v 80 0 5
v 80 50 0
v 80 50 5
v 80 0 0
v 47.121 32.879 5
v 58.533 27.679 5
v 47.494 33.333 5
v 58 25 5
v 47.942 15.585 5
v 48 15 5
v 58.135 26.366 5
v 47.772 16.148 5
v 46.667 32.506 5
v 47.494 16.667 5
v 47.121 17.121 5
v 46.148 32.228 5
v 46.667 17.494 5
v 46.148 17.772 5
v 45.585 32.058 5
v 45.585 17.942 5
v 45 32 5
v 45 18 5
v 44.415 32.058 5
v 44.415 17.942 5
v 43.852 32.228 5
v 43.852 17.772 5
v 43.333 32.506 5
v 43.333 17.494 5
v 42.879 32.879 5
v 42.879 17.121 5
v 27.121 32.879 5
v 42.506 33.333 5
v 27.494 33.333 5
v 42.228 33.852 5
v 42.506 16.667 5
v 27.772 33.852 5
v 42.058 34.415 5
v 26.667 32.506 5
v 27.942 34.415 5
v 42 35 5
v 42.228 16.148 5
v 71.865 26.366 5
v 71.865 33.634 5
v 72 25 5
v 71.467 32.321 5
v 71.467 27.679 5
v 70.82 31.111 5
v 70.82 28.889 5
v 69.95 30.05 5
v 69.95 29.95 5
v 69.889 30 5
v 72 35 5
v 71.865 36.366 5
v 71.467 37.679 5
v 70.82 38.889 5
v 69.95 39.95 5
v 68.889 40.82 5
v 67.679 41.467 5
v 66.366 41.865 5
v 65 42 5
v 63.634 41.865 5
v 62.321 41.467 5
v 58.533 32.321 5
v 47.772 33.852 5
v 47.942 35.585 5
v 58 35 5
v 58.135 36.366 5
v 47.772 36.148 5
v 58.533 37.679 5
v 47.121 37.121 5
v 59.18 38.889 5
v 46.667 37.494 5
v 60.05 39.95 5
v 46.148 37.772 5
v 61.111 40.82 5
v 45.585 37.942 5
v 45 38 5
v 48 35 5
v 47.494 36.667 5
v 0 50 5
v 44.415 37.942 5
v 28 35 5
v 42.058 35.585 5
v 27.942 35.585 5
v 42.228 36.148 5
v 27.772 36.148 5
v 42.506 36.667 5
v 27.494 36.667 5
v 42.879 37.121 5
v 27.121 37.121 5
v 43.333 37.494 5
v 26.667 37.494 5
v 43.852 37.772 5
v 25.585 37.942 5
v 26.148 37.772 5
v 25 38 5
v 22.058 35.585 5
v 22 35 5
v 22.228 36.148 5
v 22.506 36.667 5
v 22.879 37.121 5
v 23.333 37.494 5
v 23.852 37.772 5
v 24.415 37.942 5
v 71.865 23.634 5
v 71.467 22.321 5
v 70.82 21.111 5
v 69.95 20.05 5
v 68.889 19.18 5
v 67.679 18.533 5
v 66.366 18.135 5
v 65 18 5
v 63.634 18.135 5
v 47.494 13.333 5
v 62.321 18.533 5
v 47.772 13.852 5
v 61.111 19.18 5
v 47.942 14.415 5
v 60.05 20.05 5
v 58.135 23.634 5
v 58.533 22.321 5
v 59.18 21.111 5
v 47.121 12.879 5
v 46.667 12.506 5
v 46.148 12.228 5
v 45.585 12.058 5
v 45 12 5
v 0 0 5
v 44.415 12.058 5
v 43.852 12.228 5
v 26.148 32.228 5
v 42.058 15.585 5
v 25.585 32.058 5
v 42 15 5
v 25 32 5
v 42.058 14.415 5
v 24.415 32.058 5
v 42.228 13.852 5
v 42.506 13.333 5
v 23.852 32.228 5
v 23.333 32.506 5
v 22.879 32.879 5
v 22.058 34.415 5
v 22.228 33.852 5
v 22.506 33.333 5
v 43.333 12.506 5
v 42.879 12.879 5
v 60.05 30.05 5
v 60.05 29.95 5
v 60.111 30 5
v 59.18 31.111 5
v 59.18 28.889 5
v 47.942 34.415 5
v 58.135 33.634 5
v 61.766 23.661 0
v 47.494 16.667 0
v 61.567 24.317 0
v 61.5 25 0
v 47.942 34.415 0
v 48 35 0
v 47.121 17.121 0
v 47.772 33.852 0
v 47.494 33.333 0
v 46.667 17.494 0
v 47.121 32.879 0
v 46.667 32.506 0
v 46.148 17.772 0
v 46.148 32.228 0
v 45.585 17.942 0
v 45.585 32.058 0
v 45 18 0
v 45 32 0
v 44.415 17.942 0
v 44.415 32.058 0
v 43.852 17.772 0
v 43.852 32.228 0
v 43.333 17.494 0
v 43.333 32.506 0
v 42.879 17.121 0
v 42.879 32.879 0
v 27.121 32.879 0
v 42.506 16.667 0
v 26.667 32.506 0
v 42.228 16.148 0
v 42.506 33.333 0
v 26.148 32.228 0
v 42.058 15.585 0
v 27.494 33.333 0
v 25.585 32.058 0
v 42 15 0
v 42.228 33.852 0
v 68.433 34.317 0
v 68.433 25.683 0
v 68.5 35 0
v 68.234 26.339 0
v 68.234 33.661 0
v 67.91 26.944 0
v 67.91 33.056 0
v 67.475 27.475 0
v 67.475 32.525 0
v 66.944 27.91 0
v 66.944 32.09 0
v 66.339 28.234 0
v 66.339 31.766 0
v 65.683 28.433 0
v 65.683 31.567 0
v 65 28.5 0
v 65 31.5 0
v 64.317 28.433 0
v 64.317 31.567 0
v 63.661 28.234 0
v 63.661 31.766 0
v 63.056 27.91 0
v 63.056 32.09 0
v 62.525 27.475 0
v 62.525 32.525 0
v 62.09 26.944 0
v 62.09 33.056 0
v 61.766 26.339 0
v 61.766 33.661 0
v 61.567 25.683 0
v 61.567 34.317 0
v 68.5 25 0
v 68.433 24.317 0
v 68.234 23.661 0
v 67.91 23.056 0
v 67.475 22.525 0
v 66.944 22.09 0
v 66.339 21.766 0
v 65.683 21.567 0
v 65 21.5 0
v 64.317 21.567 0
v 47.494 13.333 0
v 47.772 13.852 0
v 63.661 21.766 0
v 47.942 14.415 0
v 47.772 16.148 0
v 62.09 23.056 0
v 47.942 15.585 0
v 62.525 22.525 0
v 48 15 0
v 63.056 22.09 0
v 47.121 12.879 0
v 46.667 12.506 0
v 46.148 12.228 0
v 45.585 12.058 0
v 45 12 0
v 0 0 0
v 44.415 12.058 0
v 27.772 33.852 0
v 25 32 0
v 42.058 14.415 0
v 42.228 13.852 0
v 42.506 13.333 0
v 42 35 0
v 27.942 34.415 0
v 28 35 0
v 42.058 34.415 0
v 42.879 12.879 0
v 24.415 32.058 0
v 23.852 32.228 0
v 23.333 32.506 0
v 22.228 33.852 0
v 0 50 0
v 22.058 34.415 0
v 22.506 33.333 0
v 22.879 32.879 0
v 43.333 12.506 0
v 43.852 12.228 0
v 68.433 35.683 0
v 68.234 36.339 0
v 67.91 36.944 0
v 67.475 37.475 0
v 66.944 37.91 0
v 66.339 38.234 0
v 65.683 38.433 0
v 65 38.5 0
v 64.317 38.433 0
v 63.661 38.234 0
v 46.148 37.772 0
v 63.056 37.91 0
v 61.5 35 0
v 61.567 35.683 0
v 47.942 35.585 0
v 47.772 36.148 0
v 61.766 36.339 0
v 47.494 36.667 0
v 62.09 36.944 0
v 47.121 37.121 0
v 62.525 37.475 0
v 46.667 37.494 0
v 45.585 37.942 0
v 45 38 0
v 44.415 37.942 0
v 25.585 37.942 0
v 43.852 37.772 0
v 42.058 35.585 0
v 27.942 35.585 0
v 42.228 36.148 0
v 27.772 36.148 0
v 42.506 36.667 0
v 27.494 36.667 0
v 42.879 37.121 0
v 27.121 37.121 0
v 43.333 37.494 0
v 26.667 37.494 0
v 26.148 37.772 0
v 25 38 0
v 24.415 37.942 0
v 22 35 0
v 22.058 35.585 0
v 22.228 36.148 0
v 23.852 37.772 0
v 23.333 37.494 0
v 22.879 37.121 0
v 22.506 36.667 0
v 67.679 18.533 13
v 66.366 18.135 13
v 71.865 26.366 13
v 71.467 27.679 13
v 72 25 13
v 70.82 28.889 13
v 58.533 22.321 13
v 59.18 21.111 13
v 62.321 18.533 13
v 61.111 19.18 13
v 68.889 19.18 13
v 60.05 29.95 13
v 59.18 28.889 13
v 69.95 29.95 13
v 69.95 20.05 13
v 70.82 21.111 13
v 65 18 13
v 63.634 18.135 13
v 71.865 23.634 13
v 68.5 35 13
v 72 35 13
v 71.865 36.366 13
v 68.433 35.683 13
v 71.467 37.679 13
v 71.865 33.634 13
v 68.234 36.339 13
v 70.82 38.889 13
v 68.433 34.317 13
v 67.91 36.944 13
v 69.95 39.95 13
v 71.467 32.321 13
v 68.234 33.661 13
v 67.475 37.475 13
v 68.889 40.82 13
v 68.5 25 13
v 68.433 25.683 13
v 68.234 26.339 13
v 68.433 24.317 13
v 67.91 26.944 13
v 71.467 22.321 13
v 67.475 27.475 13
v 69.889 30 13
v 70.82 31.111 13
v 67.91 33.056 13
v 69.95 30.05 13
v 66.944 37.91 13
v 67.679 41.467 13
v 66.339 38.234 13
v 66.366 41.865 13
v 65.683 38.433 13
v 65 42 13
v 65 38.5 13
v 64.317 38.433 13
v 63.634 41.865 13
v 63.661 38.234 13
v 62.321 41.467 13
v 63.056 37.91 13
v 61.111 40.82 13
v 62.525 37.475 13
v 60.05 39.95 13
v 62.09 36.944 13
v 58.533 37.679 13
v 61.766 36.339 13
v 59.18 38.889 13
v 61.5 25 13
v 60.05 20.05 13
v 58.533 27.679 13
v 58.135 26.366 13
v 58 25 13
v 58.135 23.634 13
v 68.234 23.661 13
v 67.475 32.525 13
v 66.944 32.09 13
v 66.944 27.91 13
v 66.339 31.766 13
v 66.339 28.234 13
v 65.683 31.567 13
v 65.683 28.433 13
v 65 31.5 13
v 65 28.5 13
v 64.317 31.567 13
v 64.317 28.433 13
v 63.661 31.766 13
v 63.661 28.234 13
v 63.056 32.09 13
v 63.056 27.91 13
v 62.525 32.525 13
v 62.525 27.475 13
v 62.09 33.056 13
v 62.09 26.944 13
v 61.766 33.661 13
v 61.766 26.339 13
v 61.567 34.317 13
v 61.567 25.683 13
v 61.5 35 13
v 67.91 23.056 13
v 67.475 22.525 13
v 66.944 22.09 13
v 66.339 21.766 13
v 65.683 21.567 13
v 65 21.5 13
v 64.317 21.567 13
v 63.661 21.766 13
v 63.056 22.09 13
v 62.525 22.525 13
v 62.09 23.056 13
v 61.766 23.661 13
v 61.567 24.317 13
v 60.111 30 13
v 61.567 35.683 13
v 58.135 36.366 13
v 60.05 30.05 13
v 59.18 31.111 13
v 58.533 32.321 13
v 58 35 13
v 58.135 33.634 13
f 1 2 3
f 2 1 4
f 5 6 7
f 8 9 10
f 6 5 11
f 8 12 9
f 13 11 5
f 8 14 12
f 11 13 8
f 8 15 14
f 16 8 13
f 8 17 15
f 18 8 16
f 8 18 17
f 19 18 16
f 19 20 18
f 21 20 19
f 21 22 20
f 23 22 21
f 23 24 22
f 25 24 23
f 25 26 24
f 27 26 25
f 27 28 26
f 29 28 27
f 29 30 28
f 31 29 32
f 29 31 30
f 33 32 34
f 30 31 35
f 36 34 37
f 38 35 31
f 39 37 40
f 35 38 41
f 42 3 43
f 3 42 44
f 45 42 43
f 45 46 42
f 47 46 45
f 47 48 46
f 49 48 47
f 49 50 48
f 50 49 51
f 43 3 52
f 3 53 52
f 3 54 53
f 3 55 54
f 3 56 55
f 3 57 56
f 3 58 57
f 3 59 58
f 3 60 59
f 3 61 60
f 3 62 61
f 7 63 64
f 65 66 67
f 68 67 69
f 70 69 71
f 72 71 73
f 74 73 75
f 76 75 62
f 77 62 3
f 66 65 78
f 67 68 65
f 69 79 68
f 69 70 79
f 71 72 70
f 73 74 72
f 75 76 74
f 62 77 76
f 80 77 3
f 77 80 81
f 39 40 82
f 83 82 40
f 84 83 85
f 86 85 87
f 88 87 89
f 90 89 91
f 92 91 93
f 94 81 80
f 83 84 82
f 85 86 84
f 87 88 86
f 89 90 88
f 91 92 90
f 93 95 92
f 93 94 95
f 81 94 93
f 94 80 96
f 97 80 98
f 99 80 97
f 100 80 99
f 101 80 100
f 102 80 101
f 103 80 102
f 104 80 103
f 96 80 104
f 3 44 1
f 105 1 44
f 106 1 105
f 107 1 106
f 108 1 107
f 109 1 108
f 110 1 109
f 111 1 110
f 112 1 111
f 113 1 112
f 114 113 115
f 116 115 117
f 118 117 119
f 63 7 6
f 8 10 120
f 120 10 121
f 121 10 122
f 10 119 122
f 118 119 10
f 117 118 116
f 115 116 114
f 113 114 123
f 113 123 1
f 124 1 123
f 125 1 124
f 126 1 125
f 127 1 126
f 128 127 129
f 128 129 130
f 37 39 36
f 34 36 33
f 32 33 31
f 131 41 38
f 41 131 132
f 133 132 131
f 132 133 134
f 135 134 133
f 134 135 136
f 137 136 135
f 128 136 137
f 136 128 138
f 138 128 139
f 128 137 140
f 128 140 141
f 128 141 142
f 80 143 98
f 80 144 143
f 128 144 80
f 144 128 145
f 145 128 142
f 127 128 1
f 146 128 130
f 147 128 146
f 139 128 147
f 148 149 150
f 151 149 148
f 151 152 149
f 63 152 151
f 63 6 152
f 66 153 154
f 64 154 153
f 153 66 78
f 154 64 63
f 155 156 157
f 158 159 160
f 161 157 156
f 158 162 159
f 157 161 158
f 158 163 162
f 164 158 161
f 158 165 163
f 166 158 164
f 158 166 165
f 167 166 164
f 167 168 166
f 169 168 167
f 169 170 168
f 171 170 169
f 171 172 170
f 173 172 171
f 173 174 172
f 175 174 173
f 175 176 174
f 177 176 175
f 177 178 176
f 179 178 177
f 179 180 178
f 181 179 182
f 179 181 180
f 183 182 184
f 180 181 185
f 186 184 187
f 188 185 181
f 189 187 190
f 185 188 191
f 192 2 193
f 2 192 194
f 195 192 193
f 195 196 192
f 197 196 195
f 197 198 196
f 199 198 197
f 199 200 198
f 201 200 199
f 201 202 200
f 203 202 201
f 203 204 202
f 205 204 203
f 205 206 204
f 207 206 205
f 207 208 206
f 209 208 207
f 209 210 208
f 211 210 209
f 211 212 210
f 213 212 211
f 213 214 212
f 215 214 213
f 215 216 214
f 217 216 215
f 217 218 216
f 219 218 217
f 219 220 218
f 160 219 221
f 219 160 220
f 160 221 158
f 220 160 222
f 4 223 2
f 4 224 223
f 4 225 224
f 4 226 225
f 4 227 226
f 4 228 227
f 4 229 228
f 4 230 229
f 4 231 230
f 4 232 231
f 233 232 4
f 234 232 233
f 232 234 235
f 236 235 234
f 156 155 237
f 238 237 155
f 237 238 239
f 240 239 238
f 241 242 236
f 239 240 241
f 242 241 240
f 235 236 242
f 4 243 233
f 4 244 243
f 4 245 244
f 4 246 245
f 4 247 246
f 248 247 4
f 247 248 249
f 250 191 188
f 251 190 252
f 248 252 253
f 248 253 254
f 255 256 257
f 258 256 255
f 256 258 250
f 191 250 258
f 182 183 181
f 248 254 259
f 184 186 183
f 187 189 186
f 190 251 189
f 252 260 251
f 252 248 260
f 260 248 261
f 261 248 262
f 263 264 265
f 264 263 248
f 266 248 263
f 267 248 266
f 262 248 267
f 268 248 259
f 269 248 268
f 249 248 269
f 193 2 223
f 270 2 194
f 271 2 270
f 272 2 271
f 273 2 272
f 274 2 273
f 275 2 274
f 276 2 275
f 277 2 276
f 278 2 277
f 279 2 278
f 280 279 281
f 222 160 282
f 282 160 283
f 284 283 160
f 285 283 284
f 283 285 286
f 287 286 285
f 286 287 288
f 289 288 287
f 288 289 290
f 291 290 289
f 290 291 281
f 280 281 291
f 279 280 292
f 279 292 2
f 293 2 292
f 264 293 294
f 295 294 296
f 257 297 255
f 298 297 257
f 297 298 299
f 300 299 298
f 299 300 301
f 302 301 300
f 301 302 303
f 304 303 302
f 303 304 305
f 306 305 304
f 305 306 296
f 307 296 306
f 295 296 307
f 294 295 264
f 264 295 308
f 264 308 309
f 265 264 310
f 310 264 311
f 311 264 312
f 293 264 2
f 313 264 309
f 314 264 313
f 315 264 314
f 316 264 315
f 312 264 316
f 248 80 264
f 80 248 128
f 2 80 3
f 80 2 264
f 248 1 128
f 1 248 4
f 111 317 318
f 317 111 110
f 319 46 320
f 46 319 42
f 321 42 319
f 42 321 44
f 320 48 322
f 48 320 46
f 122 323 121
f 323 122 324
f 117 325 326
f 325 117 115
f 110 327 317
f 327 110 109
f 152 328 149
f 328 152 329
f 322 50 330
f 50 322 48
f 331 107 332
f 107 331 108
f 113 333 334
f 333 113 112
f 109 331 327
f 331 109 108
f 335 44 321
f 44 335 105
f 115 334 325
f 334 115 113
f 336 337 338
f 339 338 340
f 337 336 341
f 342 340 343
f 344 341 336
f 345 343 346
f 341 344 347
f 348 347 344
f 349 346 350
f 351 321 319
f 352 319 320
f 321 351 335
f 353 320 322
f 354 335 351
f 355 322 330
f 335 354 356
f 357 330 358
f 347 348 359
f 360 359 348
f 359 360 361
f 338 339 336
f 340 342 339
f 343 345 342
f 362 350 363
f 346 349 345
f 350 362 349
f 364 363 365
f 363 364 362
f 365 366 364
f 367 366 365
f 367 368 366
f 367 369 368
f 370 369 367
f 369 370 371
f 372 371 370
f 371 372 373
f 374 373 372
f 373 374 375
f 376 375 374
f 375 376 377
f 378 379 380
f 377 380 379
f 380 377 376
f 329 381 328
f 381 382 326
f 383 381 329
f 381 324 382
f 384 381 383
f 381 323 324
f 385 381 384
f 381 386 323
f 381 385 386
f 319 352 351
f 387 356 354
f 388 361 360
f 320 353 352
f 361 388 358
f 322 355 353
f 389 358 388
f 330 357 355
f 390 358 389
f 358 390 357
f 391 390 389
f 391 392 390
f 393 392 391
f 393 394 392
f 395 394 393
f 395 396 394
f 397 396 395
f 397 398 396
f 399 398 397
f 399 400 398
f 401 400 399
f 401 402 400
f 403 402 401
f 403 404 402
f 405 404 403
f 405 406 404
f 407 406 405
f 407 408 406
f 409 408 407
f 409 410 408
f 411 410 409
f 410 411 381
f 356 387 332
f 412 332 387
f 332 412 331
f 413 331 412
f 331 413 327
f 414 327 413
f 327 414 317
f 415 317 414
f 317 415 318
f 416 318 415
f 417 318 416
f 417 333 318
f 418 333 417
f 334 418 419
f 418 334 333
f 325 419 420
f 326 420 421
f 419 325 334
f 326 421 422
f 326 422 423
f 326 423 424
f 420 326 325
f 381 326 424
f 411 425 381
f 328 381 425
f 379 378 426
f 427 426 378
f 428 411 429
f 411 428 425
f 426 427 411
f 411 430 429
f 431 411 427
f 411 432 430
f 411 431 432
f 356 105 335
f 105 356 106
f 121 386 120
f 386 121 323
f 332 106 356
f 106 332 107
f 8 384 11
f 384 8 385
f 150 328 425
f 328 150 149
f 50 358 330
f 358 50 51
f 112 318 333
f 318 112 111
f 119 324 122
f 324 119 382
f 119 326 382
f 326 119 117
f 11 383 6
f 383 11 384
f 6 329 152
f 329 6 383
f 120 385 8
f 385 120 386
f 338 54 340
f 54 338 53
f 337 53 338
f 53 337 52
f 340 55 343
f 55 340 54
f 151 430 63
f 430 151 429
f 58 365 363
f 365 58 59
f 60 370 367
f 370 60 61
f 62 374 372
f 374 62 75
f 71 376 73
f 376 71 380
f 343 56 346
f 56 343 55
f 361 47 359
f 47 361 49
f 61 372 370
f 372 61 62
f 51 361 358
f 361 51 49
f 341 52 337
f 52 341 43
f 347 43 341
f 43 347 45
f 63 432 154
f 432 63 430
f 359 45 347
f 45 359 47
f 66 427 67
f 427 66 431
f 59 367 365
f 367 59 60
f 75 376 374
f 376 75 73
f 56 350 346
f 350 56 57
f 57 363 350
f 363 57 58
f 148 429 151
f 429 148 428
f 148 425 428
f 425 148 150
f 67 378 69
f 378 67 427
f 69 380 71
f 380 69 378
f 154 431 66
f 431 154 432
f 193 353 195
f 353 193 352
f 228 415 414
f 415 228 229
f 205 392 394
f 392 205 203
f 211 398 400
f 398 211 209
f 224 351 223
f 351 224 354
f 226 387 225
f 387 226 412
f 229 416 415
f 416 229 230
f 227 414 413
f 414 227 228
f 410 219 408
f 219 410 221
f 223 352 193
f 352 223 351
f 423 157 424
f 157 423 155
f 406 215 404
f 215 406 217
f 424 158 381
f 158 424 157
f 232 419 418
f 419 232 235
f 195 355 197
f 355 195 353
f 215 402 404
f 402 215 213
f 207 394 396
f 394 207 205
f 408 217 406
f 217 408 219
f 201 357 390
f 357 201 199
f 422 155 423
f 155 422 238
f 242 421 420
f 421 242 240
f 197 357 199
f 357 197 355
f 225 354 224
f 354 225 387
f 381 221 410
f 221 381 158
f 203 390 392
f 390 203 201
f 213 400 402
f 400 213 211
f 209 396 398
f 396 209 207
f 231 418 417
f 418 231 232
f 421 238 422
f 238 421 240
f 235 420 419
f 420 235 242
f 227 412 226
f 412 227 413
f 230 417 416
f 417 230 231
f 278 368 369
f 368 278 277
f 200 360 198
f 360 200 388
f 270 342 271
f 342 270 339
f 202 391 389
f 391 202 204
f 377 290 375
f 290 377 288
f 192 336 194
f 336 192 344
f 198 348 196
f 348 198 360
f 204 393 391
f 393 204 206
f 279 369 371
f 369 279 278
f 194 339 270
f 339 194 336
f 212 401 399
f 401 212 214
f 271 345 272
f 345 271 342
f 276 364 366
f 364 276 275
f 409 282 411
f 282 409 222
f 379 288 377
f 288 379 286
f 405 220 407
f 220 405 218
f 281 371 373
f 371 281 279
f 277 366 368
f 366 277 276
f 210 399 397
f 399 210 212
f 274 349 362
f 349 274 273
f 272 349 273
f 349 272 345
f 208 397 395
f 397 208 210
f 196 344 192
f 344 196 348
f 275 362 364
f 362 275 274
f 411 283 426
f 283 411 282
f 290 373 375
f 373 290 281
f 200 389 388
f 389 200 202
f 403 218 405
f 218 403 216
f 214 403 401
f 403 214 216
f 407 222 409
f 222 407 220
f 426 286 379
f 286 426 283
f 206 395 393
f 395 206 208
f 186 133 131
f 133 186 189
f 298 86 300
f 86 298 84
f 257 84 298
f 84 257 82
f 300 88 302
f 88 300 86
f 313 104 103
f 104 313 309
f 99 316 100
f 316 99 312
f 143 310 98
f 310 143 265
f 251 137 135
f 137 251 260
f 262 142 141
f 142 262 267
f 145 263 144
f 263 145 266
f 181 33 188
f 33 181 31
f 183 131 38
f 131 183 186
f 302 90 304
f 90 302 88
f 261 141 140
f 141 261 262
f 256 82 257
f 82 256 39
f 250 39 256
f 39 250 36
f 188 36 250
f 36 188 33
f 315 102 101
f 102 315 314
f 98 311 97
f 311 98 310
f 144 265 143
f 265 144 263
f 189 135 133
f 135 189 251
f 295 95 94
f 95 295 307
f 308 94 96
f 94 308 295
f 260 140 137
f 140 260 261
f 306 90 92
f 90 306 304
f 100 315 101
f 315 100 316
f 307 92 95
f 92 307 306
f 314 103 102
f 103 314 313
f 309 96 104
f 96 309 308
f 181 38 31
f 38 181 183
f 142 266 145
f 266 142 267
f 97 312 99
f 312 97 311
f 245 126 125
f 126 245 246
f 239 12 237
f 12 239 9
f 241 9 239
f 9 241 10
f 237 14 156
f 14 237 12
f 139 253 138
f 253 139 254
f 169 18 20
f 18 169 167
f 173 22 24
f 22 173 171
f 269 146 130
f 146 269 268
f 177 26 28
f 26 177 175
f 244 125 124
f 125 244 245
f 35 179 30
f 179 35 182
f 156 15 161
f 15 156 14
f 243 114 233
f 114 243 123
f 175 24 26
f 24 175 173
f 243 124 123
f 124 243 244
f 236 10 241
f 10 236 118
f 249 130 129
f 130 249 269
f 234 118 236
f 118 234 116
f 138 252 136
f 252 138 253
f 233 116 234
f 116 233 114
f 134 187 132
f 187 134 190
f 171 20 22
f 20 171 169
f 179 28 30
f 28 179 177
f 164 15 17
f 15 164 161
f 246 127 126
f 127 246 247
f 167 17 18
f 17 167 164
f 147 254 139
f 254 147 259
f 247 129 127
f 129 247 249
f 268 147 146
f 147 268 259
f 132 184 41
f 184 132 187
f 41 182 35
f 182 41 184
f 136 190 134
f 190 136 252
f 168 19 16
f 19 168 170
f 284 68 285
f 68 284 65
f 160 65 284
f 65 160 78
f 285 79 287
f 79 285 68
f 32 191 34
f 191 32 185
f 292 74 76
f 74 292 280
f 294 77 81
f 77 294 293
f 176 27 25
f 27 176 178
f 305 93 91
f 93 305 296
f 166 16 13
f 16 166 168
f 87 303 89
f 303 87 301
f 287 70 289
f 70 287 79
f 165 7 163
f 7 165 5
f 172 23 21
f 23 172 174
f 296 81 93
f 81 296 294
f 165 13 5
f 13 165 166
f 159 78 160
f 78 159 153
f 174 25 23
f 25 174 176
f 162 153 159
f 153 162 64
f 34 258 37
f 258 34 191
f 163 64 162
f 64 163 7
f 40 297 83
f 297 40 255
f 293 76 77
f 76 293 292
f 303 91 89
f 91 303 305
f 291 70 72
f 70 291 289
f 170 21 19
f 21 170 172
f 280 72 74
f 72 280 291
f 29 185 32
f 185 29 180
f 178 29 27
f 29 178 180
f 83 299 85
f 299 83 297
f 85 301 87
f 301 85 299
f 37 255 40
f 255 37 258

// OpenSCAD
$fn = 32;

// ----------------------------------------------------------------------
// Mixed field: bosses and holes at given coordinates
// ----------------------------------------------------------------------

// --- parameters (mm) ---
plate_l = 80;             // plate length, X
plate_w = 50;             // plate width, Y
plate_t = 5;              // plate thickness, Z
boss_d = 14;              // boss diameter
boss_h = 8;               // boss height above the plate
hole_d = 6;               // through hole diameter
fit_tol = 0.05;           // tolerance for press fits, mm
free_tol = 0.2;           // tolerance for clearance fits, mm

total_h = plate_t + boss_h;  // overall height

difference() {
  union() {
    cube([plate_l, plate_w, plate_t]);
    translate([65, 25, plate_t]) cylinder(h = boss_h, d = boss_d);
    translate([65, 35, plate_t]) cylinder(h = boss_h, d = boss_d);
  }
  translate([65, 25, -1]) cylinder(h = total_h + 2, d = boss_d / 2);
  translate([65, 35, -1]) cylinder(h = total_h + 2, d = boss_d / 2);
  translate([25, 35, -1]) cylinder(h = plate_t + 2, d = hole_d);
  translate([45, 15, -1]) cylinder(h = plate_t + 2, d = hole_d);
  translate([45, 35, -1]) cylinder(h = plate_t + 2, d = hole_d);
}
